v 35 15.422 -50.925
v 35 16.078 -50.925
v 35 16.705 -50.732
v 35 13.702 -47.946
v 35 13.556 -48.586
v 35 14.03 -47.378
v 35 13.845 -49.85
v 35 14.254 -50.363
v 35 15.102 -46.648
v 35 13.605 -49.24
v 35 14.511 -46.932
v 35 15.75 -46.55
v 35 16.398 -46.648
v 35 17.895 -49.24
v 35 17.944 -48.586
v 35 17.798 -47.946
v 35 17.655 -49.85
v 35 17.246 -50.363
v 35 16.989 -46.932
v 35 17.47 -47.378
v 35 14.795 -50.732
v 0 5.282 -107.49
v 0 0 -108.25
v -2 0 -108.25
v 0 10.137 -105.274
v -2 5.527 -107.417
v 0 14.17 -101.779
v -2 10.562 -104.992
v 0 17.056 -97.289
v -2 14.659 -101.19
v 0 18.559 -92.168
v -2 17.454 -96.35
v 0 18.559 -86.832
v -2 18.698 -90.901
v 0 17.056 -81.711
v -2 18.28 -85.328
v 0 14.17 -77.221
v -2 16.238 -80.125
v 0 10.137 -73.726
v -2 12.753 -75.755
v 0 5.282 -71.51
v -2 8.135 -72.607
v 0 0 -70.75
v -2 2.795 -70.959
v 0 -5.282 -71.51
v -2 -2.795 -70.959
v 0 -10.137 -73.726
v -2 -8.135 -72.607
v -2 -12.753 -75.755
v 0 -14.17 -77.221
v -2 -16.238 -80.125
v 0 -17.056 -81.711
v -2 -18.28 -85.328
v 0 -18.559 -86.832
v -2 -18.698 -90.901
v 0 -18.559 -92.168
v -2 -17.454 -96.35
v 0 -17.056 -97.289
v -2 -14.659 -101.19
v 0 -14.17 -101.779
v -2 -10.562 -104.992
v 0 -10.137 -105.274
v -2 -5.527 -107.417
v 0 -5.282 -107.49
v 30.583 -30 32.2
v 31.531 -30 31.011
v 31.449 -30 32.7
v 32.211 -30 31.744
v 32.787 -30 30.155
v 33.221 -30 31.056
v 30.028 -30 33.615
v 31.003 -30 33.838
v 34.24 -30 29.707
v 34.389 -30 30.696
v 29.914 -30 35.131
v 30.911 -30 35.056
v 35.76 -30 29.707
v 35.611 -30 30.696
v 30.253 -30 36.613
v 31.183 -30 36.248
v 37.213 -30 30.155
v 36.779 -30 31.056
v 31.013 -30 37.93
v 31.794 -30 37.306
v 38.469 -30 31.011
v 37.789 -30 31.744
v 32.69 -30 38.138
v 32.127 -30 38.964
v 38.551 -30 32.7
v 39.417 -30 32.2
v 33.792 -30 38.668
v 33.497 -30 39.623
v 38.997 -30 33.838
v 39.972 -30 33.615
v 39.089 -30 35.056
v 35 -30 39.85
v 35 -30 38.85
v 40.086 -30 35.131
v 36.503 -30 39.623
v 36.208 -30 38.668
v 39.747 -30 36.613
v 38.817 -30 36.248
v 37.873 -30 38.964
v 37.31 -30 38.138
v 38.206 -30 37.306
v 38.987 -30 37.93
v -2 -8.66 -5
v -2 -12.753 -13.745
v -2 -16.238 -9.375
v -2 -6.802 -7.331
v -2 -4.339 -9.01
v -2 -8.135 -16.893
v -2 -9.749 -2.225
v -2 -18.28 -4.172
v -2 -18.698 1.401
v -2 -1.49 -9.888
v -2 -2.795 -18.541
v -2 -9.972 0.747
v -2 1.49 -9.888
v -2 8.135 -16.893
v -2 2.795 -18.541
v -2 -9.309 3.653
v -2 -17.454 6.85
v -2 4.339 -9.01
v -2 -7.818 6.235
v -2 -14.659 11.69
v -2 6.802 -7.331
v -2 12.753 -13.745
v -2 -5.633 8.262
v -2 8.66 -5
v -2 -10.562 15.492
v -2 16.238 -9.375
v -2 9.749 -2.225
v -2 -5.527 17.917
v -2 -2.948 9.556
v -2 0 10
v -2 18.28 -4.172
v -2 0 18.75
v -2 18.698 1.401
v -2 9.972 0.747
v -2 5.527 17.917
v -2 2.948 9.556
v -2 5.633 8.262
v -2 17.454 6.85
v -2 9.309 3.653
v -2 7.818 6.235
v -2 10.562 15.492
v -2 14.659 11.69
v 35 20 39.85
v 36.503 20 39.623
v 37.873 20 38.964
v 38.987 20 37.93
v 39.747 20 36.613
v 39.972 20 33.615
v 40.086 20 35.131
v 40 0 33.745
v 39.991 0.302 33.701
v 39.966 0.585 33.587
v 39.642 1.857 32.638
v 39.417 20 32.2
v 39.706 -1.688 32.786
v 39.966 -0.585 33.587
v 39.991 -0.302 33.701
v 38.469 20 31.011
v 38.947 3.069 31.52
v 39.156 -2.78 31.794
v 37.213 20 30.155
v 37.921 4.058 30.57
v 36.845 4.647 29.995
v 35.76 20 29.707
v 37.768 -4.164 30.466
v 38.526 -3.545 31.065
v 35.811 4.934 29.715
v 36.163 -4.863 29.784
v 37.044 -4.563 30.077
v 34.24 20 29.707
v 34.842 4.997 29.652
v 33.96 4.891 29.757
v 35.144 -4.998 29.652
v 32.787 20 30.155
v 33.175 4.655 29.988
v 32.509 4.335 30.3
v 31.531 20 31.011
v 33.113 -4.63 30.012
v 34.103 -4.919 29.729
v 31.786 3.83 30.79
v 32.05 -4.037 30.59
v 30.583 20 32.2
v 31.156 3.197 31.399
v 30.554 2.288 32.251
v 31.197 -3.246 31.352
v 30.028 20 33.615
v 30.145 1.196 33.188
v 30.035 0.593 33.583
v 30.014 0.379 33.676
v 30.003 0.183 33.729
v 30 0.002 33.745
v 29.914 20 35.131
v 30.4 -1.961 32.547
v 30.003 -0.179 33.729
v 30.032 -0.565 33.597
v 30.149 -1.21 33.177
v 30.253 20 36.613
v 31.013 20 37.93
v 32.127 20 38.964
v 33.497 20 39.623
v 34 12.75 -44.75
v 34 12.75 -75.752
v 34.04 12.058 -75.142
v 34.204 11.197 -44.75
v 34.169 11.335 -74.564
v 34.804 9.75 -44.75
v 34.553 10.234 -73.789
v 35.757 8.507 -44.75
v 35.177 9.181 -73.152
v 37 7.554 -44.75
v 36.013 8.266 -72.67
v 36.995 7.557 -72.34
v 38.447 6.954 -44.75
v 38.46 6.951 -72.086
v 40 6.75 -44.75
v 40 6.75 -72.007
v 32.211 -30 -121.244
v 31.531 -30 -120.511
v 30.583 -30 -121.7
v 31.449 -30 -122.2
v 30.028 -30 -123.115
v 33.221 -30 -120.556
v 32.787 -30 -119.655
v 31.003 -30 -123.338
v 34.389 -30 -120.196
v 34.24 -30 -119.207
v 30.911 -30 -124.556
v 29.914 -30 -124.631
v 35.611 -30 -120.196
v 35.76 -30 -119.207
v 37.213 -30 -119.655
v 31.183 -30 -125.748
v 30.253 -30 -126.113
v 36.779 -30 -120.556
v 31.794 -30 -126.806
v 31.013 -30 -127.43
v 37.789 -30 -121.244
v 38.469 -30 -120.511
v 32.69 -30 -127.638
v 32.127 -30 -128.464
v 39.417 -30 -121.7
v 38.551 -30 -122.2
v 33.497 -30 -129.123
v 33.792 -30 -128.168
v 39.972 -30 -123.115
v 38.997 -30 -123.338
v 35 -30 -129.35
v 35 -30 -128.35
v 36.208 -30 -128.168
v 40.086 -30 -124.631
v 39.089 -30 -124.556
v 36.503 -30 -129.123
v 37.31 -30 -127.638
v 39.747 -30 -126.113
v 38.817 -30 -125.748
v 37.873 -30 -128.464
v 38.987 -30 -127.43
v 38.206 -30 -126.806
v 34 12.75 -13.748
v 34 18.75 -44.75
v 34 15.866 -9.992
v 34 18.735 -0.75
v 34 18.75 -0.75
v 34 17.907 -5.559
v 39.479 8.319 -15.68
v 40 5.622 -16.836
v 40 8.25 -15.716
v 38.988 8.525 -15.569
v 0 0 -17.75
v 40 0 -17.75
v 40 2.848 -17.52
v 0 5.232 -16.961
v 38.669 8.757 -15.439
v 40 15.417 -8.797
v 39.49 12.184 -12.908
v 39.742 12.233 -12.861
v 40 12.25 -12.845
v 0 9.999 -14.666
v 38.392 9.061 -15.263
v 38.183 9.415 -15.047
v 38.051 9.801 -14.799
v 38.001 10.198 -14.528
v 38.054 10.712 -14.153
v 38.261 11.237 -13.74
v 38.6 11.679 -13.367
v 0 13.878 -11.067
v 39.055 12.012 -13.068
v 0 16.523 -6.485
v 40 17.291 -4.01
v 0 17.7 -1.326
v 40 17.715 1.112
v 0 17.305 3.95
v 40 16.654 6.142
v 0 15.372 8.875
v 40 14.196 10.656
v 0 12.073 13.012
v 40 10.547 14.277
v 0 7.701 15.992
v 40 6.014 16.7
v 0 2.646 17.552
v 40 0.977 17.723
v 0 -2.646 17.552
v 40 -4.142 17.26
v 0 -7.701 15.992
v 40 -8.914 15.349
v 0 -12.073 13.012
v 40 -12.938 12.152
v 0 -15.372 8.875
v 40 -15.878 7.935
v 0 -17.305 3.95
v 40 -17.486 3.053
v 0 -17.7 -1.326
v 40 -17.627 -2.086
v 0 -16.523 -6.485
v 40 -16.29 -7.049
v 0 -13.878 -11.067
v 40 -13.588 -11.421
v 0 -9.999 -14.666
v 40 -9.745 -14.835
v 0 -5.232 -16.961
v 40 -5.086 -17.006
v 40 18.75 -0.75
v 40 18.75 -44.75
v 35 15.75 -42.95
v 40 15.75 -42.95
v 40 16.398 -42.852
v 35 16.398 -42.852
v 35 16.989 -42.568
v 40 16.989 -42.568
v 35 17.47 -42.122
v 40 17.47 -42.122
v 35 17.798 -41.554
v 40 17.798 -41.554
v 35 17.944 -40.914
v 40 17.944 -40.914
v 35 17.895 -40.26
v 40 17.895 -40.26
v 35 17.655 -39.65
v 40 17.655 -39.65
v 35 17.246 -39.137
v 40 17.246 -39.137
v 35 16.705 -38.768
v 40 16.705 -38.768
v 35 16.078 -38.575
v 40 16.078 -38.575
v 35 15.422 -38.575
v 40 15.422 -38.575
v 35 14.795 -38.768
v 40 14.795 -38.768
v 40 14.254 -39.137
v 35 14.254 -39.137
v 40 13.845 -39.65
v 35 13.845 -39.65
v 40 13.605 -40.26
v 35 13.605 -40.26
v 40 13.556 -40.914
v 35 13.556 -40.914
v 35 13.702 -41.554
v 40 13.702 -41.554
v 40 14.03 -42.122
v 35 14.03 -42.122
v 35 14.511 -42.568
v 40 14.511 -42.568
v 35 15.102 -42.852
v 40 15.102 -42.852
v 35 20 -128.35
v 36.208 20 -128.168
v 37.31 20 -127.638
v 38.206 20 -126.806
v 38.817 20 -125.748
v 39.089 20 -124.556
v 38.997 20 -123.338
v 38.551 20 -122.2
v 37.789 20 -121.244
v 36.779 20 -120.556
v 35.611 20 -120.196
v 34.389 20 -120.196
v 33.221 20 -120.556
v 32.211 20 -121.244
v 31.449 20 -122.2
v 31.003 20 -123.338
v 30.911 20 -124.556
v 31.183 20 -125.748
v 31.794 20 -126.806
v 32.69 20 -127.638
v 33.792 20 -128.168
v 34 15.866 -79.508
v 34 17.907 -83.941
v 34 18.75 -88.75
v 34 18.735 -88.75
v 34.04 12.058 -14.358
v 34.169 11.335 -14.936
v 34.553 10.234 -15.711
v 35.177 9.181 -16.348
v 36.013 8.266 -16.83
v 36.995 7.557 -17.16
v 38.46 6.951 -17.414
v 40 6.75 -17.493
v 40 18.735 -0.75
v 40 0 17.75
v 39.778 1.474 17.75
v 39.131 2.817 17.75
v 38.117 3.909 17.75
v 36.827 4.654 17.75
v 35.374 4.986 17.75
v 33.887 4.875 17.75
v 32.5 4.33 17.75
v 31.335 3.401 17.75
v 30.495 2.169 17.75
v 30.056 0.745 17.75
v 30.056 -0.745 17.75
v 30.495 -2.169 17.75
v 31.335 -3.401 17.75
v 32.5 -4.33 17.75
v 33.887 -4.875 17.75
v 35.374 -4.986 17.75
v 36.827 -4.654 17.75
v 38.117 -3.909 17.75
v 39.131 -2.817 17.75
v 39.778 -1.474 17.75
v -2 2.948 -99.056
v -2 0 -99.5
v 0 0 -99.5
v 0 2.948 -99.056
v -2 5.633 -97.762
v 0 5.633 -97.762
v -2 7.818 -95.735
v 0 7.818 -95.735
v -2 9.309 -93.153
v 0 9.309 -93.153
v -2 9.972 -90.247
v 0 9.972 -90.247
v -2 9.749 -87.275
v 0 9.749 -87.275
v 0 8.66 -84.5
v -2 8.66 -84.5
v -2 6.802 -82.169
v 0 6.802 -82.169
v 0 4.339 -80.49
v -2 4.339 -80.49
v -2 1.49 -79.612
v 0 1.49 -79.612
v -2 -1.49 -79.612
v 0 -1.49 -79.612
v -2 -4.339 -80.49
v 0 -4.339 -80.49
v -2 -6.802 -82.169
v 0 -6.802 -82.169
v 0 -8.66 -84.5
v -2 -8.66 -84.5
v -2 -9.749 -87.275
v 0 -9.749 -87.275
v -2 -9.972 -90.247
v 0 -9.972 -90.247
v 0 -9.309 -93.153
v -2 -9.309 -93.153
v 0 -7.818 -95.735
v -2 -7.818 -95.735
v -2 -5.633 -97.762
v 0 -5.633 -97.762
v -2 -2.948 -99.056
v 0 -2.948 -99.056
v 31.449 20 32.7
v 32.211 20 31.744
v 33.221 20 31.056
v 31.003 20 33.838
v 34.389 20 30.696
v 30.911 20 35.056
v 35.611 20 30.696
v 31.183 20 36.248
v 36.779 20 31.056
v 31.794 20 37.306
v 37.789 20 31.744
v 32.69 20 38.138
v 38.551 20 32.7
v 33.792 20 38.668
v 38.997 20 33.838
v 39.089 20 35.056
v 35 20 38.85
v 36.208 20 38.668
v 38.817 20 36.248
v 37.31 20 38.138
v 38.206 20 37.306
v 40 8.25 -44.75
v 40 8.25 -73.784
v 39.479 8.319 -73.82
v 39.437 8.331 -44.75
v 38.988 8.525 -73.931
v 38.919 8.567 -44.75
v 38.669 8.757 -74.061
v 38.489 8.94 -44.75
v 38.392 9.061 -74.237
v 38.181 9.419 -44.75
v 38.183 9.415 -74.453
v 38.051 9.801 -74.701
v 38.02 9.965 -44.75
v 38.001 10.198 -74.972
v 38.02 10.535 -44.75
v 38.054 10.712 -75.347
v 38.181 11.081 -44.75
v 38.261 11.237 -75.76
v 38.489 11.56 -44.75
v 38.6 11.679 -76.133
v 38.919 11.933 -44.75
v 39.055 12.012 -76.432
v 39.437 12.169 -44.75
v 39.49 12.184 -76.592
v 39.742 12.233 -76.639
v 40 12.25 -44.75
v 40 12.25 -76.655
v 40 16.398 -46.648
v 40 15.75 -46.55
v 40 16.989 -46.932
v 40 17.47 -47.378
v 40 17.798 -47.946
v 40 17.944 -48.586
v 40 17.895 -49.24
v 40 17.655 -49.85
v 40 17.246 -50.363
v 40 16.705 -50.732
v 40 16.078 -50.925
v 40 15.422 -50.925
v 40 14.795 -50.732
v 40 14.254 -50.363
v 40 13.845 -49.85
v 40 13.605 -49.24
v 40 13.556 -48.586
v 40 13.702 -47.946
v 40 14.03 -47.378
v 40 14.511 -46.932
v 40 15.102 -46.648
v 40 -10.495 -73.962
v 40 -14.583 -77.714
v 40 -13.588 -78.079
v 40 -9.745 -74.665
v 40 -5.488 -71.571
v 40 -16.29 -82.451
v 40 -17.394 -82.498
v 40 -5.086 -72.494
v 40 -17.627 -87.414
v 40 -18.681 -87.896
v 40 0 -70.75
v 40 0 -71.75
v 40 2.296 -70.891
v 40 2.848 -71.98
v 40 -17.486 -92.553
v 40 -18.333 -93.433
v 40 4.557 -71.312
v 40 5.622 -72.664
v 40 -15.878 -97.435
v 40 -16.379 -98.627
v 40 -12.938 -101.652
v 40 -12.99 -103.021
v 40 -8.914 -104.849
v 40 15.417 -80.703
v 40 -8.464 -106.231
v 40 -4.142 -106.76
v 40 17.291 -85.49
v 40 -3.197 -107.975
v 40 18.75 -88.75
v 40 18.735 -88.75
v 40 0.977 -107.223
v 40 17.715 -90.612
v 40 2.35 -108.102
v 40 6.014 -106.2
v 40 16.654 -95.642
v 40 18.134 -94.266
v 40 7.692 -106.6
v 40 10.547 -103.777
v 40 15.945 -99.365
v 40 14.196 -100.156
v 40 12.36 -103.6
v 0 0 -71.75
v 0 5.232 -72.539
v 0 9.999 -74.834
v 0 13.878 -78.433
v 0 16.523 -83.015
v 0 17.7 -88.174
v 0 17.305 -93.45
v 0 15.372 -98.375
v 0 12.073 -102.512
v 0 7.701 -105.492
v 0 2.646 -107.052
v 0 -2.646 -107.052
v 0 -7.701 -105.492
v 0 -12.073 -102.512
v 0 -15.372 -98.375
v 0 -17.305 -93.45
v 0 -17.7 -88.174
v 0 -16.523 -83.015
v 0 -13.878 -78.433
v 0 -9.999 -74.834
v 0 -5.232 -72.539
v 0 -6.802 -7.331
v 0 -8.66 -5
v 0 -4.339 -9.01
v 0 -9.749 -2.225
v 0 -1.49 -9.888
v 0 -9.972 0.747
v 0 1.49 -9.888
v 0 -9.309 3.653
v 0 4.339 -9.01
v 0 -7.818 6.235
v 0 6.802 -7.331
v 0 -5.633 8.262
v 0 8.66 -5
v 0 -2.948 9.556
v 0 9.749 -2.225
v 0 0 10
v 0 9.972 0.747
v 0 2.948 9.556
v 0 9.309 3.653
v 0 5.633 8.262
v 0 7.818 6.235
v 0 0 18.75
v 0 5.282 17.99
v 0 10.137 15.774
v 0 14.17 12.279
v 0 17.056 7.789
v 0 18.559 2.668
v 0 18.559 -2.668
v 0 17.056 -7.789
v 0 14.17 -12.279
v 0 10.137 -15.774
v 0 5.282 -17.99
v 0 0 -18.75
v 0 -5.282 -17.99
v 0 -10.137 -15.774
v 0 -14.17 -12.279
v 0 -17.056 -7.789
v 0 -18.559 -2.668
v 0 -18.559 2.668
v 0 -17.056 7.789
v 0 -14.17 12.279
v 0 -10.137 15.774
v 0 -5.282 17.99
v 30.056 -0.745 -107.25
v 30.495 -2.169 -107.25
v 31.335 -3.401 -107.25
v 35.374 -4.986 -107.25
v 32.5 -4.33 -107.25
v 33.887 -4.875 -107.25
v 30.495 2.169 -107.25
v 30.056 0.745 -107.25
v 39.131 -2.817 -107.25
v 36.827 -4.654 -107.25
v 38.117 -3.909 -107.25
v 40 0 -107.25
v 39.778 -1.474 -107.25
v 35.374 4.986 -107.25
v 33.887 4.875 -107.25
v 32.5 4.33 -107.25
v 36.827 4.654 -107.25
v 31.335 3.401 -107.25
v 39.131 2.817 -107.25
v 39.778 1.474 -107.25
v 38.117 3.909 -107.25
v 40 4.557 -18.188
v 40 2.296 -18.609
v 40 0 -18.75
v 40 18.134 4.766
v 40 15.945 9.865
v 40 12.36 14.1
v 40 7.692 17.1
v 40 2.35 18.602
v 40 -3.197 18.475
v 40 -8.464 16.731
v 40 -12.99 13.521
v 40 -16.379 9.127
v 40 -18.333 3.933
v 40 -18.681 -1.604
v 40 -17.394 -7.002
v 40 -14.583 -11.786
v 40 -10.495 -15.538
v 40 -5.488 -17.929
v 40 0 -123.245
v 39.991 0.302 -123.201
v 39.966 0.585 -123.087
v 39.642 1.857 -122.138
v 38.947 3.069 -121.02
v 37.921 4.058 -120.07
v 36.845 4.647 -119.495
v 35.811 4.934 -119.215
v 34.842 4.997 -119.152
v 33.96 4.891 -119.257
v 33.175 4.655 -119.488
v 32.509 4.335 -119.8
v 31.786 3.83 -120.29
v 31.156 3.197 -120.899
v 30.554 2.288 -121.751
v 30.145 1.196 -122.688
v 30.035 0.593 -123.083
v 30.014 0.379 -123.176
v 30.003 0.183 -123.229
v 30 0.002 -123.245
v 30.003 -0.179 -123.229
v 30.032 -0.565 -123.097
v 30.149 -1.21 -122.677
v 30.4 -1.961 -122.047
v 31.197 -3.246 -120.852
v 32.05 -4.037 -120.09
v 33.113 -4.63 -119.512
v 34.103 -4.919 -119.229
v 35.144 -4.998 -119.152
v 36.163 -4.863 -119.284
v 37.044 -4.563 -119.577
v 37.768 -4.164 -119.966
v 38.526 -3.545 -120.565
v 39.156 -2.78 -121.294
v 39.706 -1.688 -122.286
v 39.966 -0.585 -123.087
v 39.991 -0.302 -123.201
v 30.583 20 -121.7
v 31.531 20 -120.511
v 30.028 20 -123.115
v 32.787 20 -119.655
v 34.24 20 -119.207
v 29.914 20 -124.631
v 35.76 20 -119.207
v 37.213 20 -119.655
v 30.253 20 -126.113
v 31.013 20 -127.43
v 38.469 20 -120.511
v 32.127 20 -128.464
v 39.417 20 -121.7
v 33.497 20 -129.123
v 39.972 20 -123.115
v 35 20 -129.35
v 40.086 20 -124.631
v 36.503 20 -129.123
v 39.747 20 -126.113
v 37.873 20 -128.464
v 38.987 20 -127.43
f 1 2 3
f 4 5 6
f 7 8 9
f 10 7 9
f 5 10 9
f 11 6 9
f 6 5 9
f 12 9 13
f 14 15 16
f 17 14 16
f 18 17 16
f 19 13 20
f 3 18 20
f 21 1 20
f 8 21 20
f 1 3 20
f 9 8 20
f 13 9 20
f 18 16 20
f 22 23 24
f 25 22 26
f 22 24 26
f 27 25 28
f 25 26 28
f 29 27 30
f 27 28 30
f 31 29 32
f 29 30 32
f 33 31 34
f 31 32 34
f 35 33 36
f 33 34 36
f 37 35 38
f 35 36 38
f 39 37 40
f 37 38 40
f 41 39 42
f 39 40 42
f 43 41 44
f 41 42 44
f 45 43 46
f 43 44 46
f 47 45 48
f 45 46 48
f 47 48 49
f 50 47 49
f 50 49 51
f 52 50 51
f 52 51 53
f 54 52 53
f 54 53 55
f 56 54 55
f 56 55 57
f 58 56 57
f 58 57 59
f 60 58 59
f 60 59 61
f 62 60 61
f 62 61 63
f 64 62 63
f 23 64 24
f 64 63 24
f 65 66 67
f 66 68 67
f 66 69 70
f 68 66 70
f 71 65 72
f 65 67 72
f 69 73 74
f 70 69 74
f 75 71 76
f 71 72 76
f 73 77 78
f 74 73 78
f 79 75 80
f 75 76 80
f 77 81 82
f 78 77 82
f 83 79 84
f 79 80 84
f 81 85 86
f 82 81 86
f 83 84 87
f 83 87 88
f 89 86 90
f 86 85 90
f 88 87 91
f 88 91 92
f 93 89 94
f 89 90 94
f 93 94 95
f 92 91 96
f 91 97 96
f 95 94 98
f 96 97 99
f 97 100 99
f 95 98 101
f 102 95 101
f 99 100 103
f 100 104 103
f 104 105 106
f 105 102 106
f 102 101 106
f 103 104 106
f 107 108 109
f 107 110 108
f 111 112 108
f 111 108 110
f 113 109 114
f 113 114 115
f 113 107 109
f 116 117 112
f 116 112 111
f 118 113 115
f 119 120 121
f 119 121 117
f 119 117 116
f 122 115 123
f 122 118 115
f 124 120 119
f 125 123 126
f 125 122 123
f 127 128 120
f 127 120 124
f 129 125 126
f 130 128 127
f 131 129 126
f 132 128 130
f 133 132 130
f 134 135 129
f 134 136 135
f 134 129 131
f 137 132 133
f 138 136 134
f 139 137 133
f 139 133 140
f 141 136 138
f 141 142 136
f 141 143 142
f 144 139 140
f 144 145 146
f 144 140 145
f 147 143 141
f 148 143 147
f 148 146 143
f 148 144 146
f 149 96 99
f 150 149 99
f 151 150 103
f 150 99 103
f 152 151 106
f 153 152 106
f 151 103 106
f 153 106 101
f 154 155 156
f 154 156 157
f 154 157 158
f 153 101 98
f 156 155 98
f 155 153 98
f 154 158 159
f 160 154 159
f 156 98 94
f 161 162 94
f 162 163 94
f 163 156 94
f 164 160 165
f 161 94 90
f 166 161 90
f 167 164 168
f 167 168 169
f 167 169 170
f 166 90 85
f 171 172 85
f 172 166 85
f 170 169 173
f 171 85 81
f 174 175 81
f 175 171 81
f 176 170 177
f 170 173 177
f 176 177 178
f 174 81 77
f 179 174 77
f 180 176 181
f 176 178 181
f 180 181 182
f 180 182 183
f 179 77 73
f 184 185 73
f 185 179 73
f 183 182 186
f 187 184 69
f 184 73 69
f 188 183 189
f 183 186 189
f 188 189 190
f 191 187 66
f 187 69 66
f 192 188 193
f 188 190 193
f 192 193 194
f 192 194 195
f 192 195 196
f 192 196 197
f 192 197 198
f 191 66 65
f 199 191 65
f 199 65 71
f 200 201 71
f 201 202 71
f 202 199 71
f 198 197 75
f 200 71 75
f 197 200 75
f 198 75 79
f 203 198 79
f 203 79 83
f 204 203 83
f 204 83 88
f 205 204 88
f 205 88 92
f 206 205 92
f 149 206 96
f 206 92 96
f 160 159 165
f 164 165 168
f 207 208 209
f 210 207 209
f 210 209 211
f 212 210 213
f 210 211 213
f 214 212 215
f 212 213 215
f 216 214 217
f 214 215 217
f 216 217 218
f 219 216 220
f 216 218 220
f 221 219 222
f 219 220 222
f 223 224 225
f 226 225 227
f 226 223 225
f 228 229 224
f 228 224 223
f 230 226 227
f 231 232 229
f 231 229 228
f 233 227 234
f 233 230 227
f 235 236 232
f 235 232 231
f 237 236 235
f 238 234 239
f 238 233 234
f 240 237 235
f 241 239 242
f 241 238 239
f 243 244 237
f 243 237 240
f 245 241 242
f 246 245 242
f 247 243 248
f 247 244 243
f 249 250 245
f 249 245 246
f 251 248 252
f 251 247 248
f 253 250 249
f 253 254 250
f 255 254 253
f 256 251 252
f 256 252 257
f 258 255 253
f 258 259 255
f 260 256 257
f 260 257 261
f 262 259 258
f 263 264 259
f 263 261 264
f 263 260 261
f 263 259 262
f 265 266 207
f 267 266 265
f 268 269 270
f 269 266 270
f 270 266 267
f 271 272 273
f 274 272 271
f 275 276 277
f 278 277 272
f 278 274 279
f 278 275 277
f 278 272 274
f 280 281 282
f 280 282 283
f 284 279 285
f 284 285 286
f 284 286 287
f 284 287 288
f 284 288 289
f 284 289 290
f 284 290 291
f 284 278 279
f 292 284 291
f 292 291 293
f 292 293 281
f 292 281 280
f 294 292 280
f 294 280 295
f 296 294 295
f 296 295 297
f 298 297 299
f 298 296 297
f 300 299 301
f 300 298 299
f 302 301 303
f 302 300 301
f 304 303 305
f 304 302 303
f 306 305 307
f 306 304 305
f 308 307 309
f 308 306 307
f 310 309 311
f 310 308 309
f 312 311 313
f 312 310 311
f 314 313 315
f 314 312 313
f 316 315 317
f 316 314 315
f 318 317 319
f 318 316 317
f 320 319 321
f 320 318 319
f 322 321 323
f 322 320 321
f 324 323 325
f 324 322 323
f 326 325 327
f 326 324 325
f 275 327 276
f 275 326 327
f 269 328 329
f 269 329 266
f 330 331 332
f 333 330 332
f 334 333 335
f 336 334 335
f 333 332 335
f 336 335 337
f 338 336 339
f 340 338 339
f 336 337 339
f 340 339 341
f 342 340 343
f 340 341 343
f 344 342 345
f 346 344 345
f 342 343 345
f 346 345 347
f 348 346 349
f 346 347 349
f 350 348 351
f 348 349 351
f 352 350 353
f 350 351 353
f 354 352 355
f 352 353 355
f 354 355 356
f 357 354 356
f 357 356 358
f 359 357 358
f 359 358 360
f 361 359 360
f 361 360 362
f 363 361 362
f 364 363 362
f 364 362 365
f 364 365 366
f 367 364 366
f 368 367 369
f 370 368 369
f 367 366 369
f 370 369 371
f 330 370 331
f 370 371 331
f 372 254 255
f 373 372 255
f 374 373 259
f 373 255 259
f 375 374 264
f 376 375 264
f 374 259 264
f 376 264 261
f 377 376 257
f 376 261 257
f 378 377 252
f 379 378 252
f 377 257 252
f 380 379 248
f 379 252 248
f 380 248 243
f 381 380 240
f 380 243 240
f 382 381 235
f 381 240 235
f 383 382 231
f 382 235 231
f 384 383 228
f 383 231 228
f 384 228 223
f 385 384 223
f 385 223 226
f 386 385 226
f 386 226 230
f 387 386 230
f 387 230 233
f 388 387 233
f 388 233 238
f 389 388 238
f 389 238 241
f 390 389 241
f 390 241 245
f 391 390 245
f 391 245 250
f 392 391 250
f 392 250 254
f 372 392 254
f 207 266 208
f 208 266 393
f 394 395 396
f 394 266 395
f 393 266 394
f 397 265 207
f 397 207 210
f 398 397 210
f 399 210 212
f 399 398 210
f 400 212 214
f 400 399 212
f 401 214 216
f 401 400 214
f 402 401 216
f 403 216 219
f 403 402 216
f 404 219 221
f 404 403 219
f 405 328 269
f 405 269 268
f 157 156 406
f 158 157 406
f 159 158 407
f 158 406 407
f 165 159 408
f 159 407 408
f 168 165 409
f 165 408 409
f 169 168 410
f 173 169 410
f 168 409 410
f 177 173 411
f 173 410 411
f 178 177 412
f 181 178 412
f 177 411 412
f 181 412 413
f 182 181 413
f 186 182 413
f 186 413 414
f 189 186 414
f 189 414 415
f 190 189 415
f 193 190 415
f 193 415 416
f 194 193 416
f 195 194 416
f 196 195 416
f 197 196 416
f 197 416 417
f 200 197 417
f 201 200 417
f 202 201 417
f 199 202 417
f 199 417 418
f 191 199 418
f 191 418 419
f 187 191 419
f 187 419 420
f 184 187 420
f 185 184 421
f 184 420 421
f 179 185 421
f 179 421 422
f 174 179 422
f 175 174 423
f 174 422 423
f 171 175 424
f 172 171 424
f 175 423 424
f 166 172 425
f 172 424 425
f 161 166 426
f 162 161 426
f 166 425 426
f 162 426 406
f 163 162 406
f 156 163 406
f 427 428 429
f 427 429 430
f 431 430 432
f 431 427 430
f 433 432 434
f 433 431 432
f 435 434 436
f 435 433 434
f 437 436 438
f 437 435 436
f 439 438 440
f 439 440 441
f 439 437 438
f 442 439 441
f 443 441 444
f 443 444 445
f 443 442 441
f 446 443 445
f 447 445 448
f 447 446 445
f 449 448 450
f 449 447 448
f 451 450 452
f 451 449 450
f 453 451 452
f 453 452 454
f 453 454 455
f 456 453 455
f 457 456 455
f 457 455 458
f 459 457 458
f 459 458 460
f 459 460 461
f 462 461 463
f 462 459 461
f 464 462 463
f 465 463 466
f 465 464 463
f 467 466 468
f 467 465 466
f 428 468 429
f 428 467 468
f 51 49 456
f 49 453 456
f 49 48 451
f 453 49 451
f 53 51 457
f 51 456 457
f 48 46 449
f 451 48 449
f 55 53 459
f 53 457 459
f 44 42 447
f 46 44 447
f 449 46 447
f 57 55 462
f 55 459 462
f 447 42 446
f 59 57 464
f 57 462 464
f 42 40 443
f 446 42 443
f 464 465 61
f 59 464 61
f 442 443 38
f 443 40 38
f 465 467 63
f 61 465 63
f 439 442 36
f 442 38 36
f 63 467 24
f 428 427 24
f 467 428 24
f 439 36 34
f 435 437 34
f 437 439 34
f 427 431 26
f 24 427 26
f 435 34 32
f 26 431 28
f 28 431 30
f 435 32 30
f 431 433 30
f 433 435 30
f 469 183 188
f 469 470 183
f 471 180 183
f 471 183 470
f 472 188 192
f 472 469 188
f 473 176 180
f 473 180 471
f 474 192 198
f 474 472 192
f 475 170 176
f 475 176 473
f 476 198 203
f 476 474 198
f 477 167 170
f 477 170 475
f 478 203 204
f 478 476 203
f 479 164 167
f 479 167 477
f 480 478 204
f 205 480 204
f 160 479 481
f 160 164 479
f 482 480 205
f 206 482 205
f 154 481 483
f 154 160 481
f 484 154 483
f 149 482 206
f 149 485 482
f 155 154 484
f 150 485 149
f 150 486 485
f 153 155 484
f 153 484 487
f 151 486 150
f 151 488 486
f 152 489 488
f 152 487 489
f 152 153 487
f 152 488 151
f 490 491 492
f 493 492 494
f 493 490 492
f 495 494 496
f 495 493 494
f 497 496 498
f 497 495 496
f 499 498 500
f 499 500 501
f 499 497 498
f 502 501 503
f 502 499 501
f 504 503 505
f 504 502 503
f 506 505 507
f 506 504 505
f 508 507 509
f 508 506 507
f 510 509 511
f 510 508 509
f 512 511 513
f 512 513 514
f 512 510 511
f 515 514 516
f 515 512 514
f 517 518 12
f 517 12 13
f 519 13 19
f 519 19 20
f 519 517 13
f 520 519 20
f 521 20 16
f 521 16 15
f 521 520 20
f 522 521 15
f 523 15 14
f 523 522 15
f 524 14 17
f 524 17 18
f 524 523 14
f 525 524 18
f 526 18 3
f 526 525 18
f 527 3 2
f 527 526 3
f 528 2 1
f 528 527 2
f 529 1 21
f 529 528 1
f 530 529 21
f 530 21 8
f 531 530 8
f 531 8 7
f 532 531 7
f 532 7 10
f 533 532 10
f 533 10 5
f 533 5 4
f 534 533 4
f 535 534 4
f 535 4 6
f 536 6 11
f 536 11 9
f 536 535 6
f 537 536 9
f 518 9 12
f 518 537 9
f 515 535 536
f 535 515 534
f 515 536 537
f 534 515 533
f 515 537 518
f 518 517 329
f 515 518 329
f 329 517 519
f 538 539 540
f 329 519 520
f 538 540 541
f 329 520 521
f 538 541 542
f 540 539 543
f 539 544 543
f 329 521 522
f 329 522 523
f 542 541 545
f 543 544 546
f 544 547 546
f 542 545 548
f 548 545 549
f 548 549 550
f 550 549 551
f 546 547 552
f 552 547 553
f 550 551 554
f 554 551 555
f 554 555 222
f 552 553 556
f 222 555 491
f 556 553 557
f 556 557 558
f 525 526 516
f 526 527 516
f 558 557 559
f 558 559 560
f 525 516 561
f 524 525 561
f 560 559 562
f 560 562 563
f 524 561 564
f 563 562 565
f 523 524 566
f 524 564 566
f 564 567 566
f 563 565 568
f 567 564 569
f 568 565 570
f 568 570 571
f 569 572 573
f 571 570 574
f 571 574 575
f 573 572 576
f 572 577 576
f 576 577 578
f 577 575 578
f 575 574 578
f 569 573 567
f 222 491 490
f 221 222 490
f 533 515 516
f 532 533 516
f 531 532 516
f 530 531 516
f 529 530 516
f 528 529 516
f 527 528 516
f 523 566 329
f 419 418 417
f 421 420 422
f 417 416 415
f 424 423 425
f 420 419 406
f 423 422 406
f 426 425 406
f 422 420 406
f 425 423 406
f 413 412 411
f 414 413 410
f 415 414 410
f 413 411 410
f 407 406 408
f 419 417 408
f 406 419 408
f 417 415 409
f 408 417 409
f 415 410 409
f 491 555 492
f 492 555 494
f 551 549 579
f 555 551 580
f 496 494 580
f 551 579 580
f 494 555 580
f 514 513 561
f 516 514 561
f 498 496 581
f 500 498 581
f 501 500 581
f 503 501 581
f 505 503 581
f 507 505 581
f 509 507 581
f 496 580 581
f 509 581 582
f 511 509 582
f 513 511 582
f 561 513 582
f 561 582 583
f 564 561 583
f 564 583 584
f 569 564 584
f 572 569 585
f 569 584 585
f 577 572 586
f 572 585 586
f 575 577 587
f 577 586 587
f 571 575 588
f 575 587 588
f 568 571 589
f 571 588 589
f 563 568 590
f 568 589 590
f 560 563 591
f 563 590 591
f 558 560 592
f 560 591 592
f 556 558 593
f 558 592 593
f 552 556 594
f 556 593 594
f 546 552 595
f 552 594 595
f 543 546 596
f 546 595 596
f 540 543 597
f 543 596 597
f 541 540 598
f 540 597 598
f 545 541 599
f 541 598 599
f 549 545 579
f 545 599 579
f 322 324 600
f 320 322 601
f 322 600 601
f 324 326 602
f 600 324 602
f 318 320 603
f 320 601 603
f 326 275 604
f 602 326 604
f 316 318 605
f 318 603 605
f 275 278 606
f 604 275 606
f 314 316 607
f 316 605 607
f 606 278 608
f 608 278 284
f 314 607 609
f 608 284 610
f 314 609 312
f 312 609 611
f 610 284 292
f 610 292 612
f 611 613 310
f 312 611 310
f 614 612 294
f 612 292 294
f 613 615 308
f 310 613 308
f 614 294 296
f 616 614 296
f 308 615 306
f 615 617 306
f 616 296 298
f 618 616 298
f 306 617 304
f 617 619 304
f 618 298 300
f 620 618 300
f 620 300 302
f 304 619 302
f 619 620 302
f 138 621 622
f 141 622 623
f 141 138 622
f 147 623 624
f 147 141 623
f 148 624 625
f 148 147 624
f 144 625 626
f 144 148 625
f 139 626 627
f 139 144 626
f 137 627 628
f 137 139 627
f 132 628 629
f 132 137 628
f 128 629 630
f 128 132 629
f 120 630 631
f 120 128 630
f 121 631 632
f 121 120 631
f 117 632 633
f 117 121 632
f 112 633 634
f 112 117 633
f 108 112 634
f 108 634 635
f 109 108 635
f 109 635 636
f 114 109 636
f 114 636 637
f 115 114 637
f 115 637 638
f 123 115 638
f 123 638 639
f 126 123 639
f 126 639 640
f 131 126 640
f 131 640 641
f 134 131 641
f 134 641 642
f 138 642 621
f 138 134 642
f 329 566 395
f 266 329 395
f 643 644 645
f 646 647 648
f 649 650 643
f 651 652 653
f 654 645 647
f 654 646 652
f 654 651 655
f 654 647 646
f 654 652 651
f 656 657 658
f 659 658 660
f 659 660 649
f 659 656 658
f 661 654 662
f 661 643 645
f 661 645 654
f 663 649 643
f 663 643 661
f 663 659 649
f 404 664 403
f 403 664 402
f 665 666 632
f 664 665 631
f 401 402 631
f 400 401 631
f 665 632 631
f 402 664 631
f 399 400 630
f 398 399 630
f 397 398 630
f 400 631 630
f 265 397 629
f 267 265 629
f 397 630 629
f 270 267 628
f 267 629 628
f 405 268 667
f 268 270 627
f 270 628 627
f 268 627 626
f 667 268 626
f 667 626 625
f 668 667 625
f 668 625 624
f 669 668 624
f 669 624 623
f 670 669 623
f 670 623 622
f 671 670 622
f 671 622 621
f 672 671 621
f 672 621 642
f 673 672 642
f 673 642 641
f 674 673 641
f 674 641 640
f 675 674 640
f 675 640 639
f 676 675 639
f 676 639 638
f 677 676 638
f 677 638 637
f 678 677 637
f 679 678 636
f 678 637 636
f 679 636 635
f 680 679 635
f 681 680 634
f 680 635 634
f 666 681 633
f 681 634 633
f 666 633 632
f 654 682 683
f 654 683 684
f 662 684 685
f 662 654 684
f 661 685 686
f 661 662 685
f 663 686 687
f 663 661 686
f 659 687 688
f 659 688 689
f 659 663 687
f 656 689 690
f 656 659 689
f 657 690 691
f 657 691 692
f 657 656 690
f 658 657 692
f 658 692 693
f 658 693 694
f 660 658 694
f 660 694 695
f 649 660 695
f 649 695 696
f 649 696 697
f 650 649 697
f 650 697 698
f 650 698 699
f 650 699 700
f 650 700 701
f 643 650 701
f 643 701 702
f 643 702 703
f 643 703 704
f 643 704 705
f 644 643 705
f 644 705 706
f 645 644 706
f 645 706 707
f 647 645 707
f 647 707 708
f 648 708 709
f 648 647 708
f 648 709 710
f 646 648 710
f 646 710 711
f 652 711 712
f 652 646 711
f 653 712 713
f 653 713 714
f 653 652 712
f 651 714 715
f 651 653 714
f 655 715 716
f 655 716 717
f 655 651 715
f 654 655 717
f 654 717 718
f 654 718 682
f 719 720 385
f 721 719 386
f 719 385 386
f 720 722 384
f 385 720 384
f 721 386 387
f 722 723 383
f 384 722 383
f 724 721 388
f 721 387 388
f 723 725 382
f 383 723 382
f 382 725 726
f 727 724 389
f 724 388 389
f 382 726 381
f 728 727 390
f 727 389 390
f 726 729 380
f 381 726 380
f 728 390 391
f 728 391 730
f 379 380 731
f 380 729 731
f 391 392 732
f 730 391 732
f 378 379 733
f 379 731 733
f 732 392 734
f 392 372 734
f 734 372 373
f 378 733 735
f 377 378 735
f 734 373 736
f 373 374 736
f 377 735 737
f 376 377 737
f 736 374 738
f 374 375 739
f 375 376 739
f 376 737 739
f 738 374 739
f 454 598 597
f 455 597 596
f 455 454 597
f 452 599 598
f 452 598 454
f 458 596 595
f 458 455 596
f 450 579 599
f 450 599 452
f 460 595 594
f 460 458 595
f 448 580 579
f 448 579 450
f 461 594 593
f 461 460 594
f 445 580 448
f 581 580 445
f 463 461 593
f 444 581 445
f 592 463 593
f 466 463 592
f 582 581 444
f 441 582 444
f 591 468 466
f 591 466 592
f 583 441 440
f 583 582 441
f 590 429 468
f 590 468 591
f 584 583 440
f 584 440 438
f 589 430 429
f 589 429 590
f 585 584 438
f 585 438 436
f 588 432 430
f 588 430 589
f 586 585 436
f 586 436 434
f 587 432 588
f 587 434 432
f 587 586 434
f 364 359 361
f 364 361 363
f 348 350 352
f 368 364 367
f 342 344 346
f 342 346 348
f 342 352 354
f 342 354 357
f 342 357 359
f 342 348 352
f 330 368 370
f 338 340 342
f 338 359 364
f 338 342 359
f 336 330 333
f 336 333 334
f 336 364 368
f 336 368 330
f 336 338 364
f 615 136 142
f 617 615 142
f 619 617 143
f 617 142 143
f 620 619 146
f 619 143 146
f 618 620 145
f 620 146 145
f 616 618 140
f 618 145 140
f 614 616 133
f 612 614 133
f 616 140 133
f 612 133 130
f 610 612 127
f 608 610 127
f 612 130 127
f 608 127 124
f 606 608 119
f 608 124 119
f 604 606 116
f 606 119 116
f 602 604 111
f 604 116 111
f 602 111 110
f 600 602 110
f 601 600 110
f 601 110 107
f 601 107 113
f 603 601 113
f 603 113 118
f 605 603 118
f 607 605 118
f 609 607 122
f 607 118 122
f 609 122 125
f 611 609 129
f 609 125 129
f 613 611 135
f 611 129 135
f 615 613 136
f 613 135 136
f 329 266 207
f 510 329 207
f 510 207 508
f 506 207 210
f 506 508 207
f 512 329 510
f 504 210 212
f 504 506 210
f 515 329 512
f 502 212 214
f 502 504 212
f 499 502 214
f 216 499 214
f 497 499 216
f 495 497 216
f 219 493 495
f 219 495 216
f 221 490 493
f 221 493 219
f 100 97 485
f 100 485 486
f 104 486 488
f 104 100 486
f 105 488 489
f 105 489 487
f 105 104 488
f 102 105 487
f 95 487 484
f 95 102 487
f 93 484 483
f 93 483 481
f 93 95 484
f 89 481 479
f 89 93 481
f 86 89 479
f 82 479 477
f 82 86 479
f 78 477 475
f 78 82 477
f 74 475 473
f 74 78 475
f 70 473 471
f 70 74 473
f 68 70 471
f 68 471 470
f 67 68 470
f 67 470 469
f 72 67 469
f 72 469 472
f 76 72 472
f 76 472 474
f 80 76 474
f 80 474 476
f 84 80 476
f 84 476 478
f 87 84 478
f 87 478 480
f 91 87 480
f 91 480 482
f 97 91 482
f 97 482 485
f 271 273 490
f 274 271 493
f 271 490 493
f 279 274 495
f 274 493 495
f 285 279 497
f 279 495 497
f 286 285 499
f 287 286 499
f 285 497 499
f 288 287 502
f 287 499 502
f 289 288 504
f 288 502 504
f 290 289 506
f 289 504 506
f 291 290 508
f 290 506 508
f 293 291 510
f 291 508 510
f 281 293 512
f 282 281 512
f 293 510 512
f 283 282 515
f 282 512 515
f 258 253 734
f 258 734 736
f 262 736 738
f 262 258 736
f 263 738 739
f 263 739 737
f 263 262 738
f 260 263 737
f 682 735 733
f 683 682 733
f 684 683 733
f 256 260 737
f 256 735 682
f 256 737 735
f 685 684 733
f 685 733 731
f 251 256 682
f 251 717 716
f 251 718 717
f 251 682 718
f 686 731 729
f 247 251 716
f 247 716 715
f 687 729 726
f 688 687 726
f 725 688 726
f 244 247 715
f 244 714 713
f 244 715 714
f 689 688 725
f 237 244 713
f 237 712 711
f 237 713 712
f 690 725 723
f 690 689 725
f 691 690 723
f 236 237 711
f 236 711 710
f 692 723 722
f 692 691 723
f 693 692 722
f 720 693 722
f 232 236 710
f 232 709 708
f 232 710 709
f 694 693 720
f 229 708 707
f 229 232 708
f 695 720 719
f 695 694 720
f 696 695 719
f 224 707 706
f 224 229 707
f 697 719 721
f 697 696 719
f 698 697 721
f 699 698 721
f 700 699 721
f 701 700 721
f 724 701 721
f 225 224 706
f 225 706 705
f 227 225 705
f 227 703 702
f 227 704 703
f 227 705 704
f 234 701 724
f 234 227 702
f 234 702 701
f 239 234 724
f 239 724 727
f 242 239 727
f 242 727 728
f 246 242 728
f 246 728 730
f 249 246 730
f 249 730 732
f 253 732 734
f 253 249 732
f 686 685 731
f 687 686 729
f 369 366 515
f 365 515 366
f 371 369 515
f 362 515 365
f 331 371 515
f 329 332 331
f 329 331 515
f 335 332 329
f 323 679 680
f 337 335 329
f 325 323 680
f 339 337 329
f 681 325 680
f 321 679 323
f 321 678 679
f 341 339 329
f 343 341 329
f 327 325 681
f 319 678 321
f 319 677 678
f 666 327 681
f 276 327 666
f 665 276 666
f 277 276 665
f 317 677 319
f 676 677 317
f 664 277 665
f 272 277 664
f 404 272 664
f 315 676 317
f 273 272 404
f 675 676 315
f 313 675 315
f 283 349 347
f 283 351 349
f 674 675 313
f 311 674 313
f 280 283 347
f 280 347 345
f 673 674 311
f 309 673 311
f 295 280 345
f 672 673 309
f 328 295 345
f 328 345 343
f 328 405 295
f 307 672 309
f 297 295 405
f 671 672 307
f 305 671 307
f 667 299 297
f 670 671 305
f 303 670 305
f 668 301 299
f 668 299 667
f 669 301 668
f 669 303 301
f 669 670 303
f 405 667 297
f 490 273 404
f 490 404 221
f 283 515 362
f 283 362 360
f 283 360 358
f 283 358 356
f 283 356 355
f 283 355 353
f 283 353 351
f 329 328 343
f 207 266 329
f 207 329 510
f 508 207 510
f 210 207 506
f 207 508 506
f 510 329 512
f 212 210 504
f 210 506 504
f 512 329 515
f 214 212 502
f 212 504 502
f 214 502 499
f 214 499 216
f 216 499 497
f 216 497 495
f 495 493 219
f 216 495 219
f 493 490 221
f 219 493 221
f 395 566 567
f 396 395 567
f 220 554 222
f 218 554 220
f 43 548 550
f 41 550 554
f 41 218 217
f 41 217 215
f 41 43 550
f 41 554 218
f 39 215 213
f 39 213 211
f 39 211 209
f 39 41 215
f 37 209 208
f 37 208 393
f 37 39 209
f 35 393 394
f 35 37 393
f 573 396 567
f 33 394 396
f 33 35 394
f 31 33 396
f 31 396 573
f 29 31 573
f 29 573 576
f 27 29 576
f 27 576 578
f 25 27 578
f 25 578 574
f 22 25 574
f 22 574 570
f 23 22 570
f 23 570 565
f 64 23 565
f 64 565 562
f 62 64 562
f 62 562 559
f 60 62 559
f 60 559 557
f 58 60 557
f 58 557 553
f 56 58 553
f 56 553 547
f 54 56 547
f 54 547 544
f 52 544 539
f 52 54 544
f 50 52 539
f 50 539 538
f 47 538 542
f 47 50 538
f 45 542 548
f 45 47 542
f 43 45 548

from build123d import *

# Parameters (mm, degrees)
SKETCH1_R                = 18.75
SKETCH1_R_2              = 17.75
BOSS_EXTRUDE1_DEPTH      = 40
BOSS_EXTRUDE2_START      = 2
SKETCH2_R                = 18.75
SKETCH2_R_2              = 10
BOSS_EXTRUDE2_DEPTH      = 2
BOSS_EXTRUDE4_START      = 17.75
BOSS_EXTRUDE4_OUTLINE_R  = 5
BOSS_EXTRUDE4_DEPTH      = 16
BOSS_EXTRUDE5_DEPTH      = 15
BOSS_EXTRUDE5_DEPTH_BACK = 35
SKETCH8_R                = 5.1
SKETCH8_R_2              = 4.1
SKETCH9_R                = 4.1
CUT_EXTRUDE1_DEPTH       = 32
BOSS_EXTRUDE6_DEPTH      = 26
BOSS_EXTRUDE6_DEPTH_BACK = 18
CUT_EXTRUDE2_START       = -26
SKETCH12_R               = 17.75
CUT_EXTRUDE2_DEPTH       = 26
SKETCH14_R               = 2.2
CUT_EXTRUDE4_DEPTH       = 5
SKETCH15_R               = 2
CUT_EXTRUDE5_DEPTH       = 34.5


# Read off the part's stored shape, not the designer's step: Boss-Extrude4
with BuildPart() as part:
    # Sketch1 → Boss-Extrude1 (new body)
    with BuildSketch(Plane.YZ):
        with Locations(Location((0, 0, 0), (0, 0, 270))):
            Circle(SKETCH1_R)
        with Locations(Location((0, 0, 0), (0, 0, 270))):
            Circle(SKETCH1_R_2, mode=Mode.SUBTRACT)
    extrude(amount=BOSS_EXTRUDE1_DEPTH)

    # Sketch2 → Boss-Extrude2 (add)
    with BuildSketch(Plane(origin=(0, 0, 0), x_dir=(0, -1, 0), z_dir=(-1, 0, 0)).offset(BOSS_EXTRUDE2_START)):
        with Locations(Location((0, 0, 0), (0, 0, 90))):
            Circle(SKETCH2_R)
        with Locations(Location((0, 0, 0), (0, 0, 90))):
            Circle(SKETCH2_R_2, mode=Mode.SUBTRACT)
    extrude(amount=-BOSS_EXTRUDE2_DEPTH)

    # Sketch11 → Boss-Extrude6 (add, two sides: drawn at the far end of the back side and taken through both)
    with BuildSketch(Plane.YX.offset(18.75).offset(-BOSS_EXTRUDE6_DEPTH_BACK)):
        with BuildLine():
            Line((6.75, 40), (18.75, 40))
            Line((18.75, 40), (18.75, 34))
            Line((18.75, 34), (12.75, 34))
            ThreePointArc((12.75, 34), (8.507359313, 35.757359313), (6.75, 40))
        make_face()
    extrude(amount=BOSS_EXTRUDE6_DEPTH + BOSS_EXTRUDE6_DEPTH_BACK)

    # Sketch12 → Cut-Extrude2 (cut)
    with BuildSketch(Plane.YZ.offset(40).offset(CUT_EXTRUDE2_START)):
        with Locations(Location((0, 0, 0), (0, 0, 270))):
            Circle(SKETCH12_R)
    extrude(amount=CUT_EXTRUDE2_DEPTH, mode=Mode.SUBTRACT)

    # Sketch14 → Cut-Extrude4 (cut)
    with BuildSketch(Plane.YZ.offset(40)):
        with Locations(Location((15.75, -40.75, 0), (0, 0, 270))):
            Circle(SKETCH14_R)
    extrude(amount=-CUT_EXTRUDE4_DEPTH, mode=Mode.SUBTRACT)

    # Sketch15 → Cut-Extrude5 (cut)
    with BuildSketch(Plane(origin=(0, 0, -44.75), x_dir=(1, 0, 0), z_dir=(0, 0, -1))):
        with Locations((40, -10.25)):
            Circle(SKETCH15_R)
    extrude(amount=-CUT_EXTRUDE5_DEPTH, mode=Mode.SUBTRACT)


with BuildPart() as body_2:
    # Boss-Extrude4 outline → Boss-Extrude4 (new body)
    with BuildSketch(Plane.XY.offset(BOSS_EXTRUDE4_START)):
        with Locations((35, 0)):
            Circle(BOSS_EXTRUDE4_OUTLINE_R)
    extrude(amount=BOSS_EXTRUDE4_DEPTH)

    # Sketch8 → Boss-Extrude5 (add, two sides: drawn at the far end of the back side and taken through both)
    with BuildSketch(Plane(origin=(0, 5, 0), x_dir=(-1, 0, 0), z_dir=(0, 1, 0)).offset(-BOSS_EXTRUDE5_DEPTH_BACK)):
        with Locations(Location((-35, 34.75, 0), (0, 0, 90))):
            Circle(SKETCH8_R)
        with Locations(Location((-35, 34.75, 0), (0, 0, 90))):
            Circle(SKETCH8_R_2, mode=Mode.SUBTRACT)
    extrude(amount=BOSS_EXTRUDE5_DEPTH + BOSS_EXTRUDE5_DEPTH_BACK)

    # Sketch9 → Cut-Extrude1 (cut)
    with BuildSketch(Plane(origin=(0, 20, 0), x_dir=(-1, 0, 0), z_dir=(0, 1, 0))):
        with Locations(Location((-35, 34.75, 0), (0, 0, 90))):
            Circle(SKETCH9_R)
    extrude(amount=-CUT_EXTRUDE1_DEPTH, mode=Mode.SUBTRACT)


with BuildPart() as body_3:
    # Mirror1: mirrored copy
    add(part.part.mirror(Plane(origin=(0, 0, -44.75), x_dir=(1, 0, 0), z_dir=(0, 0, -1))))


with BuildPart() as body_4:
    # Mirror1 2: mirrored copy
    add(body_2.part.mirror(Plane(origin=(0, 0, -44.75), x_dir=(1, 0, 0), z_dir=(0, 0, -1))))


solid = Compound([part.part, body_2.part, body_3.part, body_4.part])
